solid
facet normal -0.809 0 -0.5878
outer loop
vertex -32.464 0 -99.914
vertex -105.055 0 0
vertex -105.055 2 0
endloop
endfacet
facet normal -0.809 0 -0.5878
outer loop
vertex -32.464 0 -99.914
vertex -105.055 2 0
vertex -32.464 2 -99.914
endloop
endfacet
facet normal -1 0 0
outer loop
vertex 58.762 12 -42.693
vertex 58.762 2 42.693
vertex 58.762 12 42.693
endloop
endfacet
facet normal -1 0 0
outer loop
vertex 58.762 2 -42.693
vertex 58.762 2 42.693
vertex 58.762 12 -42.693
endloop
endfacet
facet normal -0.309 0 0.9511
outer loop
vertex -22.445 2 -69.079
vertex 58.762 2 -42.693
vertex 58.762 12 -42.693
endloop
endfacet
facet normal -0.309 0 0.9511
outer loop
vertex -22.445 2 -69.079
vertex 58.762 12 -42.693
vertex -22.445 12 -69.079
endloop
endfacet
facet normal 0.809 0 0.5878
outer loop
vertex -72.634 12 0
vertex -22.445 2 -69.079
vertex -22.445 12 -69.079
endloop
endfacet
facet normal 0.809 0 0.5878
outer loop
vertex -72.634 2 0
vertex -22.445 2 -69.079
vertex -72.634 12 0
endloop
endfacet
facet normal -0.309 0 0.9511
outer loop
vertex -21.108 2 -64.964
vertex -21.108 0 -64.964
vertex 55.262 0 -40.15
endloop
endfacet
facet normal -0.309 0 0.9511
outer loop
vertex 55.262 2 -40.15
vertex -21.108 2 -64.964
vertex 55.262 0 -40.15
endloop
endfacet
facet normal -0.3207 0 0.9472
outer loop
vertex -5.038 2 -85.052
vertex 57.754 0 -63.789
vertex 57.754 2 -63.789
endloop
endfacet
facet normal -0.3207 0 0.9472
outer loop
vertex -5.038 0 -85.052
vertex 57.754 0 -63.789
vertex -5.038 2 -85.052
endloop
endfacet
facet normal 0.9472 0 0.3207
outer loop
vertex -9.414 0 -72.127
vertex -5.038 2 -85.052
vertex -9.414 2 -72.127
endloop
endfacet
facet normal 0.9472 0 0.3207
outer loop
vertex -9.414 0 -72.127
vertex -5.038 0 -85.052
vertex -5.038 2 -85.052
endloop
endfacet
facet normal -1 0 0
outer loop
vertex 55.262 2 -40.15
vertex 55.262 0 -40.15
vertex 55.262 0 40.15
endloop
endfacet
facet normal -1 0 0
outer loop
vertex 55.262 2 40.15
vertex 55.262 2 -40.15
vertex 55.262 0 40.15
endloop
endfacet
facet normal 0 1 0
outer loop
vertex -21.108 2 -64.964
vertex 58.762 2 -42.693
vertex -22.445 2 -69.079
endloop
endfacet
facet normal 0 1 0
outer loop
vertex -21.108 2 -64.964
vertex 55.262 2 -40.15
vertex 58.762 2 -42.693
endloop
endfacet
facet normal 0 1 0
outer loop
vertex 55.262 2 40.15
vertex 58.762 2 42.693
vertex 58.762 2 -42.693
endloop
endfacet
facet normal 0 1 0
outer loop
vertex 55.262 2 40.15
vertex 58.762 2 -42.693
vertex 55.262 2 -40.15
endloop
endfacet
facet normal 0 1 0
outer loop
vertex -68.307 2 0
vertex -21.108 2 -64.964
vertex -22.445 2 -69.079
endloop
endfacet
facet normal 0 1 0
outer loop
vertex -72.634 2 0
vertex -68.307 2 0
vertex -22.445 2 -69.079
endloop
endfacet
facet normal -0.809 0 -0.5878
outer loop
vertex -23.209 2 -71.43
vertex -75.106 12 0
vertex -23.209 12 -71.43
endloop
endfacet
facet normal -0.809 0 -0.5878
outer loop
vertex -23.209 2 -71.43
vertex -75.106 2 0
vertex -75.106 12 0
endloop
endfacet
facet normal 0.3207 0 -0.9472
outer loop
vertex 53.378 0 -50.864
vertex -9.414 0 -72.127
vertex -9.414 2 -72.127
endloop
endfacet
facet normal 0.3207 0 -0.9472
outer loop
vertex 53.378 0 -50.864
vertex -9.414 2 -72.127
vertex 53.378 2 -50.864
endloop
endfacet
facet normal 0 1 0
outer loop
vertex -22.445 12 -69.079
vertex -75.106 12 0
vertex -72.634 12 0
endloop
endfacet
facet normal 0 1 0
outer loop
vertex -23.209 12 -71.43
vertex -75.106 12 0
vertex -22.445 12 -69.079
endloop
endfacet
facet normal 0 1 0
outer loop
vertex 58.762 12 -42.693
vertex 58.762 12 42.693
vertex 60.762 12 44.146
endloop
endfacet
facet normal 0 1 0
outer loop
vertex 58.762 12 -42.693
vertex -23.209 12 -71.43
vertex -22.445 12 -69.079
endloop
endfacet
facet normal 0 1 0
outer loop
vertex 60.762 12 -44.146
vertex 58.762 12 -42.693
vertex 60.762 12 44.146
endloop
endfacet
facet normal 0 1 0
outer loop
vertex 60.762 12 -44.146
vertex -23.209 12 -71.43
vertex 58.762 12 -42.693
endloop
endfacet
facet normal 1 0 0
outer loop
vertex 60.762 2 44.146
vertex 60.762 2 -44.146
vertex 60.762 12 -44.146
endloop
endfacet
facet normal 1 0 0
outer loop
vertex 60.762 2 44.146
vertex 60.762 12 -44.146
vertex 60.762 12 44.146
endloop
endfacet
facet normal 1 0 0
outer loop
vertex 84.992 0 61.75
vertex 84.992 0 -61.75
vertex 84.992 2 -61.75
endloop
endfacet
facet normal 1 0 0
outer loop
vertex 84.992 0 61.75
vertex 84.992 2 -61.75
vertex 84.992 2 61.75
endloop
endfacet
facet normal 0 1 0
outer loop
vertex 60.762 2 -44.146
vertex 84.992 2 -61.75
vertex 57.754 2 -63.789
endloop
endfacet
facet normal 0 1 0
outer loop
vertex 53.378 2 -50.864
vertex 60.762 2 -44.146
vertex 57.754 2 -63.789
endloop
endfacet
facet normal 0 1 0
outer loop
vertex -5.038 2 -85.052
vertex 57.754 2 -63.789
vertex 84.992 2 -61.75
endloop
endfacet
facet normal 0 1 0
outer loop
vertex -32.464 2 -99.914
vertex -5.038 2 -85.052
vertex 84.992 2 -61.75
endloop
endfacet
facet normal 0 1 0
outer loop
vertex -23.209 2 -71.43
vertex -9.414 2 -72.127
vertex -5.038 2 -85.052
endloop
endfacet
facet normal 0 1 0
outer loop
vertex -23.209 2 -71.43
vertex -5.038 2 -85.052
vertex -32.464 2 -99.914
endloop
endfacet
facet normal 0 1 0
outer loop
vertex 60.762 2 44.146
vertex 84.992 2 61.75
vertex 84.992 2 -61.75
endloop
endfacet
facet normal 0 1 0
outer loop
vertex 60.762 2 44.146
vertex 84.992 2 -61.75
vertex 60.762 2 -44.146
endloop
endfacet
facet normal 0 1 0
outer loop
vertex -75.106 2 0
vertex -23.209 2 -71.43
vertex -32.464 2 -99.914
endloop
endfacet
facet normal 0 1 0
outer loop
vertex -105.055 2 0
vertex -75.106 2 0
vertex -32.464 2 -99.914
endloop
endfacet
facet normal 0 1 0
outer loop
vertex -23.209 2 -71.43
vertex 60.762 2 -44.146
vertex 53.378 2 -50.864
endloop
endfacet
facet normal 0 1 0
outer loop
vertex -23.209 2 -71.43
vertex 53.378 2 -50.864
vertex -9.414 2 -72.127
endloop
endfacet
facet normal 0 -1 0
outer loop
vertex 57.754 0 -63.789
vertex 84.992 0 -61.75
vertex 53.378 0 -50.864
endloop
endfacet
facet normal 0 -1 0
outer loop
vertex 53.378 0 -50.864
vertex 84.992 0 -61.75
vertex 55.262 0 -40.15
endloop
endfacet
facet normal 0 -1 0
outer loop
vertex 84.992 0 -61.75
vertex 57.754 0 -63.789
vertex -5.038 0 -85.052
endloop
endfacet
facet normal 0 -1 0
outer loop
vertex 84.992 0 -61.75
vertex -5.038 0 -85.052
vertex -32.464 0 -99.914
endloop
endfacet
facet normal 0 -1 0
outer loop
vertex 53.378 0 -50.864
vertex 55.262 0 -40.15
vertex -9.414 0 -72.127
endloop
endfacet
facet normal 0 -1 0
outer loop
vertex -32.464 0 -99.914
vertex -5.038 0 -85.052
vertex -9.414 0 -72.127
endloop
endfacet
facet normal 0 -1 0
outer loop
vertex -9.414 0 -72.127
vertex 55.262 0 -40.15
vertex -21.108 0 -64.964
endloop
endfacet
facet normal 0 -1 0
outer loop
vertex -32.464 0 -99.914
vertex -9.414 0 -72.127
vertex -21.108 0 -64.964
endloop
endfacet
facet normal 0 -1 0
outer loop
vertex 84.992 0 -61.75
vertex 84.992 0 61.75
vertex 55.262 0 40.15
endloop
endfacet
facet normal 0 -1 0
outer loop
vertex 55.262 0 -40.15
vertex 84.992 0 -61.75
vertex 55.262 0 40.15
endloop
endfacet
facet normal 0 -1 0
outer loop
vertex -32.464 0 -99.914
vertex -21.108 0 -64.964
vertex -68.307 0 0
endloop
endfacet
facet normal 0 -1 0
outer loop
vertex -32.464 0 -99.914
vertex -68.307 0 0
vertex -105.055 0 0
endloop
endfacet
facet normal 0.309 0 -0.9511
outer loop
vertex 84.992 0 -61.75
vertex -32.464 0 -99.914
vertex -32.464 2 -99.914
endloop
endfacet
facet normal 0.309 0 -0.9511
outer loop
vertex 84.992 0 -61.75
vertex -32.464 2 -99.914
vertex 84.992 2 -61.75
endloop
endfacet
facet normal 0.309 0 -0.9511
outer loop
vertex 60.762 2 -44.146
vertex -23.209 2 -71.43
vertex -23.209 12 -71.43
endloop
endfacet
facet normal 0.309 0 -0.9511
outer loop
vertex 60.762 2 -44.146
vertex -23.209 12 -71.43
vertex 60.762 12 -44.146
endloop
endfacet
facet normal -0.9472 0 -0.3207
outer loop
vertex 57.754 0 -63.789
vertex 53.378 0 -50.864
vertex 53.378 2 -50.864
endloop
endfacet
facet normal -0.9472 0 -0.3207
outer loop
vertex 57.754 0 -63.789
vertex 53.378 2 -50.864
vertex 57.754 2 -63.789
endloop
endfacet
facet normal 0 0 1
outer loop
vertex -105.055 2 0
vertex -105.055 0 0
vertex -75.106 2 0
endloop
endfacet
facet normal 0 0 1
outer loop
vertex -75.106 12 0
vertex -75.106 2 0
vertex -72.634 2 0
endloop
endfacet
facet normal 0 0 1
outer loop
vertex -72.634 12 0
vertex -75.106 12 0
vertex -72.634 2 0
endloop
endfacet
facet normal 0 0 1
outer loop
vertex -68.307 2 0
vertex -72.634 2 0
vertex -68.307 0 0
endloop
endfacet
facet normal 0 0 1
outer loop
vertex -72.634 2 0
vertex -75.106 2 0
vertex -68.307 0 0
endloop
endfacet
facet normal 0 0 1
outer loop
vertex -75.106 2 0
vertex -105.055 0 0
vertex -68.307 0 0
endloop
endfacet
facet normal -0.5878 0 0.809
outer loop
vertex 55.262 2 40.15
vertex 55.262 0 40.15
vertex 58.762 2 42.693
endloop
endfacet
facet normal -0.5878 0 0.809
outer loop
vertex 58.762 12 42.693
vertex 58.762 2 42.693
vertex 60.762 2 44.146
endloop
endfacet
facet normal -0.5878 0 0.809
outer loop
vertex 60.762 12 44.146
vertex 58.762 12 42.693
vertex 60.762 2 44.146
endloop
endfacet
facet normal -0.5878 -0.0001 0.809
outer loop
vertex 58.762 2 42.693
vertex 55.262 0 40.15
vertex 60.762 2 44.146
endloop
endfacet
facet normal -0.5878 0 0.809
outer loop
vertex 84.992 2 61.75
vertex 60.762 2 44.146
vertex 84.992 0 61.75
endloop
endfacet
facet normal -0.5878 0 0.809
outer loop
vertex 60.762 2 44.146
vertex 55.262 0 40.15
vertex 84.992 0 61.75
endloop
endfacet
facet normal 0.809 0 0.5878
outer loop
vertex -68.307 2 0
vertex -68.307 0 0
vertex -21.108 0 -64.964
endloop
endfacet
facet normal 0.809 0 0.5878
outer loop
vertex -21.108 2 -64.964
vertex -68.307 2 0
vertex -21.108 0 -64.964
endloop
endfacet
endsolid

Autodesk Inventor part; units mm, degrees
ref_plane "YZ Plane" through (0, 0, 0) normal (1, 0, 0) x (0, 1, 0)
ref_plane "XZ Plane" through (0, 0, 0) normal (0, 1, 0) x (-1, 0, 0)
ref_plane "XY Plane" through (0, 0, 0) normal (0, 0, 1) x (1, 0, 0)
sketch "草图1" plane through (0, 0, 0) normal (0, 1, 0) x (-1, 0, 0)
  line L0 (68.3073, 0) -> (21.1081, -64.9641)
  line L1 (21.1081, -64.9641) -> (-55.2617, -40.15)
  line L2 (-55.2617, -40.15) -> (-55.2617, 40.15)
  line L3 (-55.2617, 40.15) -> (21.1081, 64.9641)
  line L4 (21.1081, 64.9641) -> (68.3073, 0)
  line L5 (105.0554, 0) -> (32.4639, -99.9136)
  line L6 (32.4639, -99.9136) -> (-84.9916, -61.75)
  line L7 (-84.9916, -61.75) -> (-84.9916, 61.75)
  line L8 (-84.9916, 61.75) -> (32.4639, 99.9136)
  line L9 (32.4639, 99.9136) -> (105.0554, 0)
  point P0 (0, 0)
  point P1 (0, 0)
  point P2 (0, 0)
  dimension "d0" = 80.3
  dimension "d1" = 123.5
extrude "拉伸1" add sketch "草图1" along normal blind 2
sketch "草图2" plane through (0, 2, 0) normal (0, 1, 0) x (1, 0, 0)
  line L0 (-21.1081, 64.9641) -> (55.2617, 40.15) projected
  line L1 (55.2617, 40.15) -> (55.2617, -40.15) projected
  line L2 (55.2617, -40.15) -> (-21.1081, -64.9641) projected
  line L3 (-21.1081, -64.9641) -> (-68.3073, 0) projected
  line L4 (-68.3073, 0) -> (-21.1081, 64.9641) projected
  line L5 (-32.4639, 99.9136) -> (-105.0554, 0) projected
  line L6 (-105.0554, 0) -> (-32.4639, -99.9136) projected
  line L7 (-32.4639, -99.9136) -> (84.9916, -61.75) projected
  line L8 (84.9916, -61.75) -> (84.9916, 61.75) projected
  line L9 (84.9916, 61.75) -> (-32.4639, 99.9136) projected
  line L10 (58.7617, 42.6929) -> (-22.445, 69.0786)
  line L11 (-22.445, 69.0786) -> (-72.6335, 0)
  line L12 (-72.6335, 0) -> (-22.445, -69.0786)
  line L13 (-22.445, -69.0786) -> (58.7617, -42.6929)
  line L14 (58.7617, -42.6929) -> (58.7617, 42.6929)
  line L15 (-23.2089, 71.4297) -> (60.7617, 44.146)
  line L16 (60.7617, 44.146) -> (60.7617, -44.146)
  line L17 (60.7617, -44.146) -> (-23.2089, -71.4297)
  line L18 (-23.2089, -71.4297) -> (-75.1056, 0)
  line L19 (-75.1056, 0) -> (-23.2089, 71.4297)
  point P0 (0, 0)
  dimension "d4" = 3.5
  dimension "d5" = 2
extrude "拉伸2" add sketch "草图2" along normal blind 10 contours L15 L16 L17 L18 L19
sketch "草图3" plane through (0, 0, 0) normal (0, -1, 0) x (1, 0, 0)
  line L0 (-9.4145, -72.1274) -> (53.3776, -50.8644)
  line L1 (53.3776, -50.8644) -> (57.7542, -63.7889)
  line L2 (57.7542, -63.7889) -> (-5.038, -85.0518)
  line L3 (-5.038, -85.0518) -> (-9.4145, -72.1274)
  point P0 (0, 0)
extrude "拉伸3" cut sketch "草图3" against normal blind 10
sketch "草图4" plane through (0, 0, 0) normal (0, -1, 0) x (1, 0, 0)
  line L0 (-105.0554, 0) -> (-32.4639, -99.9136) projected
  line L1 (-105.0554, 0) -> (0, 0)
  line L2 (0, 0) -> (99.3977, 72.2167)
  line L3 (99.3977, 72.2167) -> (-62.0091, 125.592)
  line L4 (-62.0091, 125.592) -> (-127.7953, 9.1282)
  line L5 (-127.7953, 9.1282) -> (-105.0554, 0)
extrude "拉伸4" cut sketch "草图4" against normal blind 20
properties part number "上部端盖" material "橡胶"
